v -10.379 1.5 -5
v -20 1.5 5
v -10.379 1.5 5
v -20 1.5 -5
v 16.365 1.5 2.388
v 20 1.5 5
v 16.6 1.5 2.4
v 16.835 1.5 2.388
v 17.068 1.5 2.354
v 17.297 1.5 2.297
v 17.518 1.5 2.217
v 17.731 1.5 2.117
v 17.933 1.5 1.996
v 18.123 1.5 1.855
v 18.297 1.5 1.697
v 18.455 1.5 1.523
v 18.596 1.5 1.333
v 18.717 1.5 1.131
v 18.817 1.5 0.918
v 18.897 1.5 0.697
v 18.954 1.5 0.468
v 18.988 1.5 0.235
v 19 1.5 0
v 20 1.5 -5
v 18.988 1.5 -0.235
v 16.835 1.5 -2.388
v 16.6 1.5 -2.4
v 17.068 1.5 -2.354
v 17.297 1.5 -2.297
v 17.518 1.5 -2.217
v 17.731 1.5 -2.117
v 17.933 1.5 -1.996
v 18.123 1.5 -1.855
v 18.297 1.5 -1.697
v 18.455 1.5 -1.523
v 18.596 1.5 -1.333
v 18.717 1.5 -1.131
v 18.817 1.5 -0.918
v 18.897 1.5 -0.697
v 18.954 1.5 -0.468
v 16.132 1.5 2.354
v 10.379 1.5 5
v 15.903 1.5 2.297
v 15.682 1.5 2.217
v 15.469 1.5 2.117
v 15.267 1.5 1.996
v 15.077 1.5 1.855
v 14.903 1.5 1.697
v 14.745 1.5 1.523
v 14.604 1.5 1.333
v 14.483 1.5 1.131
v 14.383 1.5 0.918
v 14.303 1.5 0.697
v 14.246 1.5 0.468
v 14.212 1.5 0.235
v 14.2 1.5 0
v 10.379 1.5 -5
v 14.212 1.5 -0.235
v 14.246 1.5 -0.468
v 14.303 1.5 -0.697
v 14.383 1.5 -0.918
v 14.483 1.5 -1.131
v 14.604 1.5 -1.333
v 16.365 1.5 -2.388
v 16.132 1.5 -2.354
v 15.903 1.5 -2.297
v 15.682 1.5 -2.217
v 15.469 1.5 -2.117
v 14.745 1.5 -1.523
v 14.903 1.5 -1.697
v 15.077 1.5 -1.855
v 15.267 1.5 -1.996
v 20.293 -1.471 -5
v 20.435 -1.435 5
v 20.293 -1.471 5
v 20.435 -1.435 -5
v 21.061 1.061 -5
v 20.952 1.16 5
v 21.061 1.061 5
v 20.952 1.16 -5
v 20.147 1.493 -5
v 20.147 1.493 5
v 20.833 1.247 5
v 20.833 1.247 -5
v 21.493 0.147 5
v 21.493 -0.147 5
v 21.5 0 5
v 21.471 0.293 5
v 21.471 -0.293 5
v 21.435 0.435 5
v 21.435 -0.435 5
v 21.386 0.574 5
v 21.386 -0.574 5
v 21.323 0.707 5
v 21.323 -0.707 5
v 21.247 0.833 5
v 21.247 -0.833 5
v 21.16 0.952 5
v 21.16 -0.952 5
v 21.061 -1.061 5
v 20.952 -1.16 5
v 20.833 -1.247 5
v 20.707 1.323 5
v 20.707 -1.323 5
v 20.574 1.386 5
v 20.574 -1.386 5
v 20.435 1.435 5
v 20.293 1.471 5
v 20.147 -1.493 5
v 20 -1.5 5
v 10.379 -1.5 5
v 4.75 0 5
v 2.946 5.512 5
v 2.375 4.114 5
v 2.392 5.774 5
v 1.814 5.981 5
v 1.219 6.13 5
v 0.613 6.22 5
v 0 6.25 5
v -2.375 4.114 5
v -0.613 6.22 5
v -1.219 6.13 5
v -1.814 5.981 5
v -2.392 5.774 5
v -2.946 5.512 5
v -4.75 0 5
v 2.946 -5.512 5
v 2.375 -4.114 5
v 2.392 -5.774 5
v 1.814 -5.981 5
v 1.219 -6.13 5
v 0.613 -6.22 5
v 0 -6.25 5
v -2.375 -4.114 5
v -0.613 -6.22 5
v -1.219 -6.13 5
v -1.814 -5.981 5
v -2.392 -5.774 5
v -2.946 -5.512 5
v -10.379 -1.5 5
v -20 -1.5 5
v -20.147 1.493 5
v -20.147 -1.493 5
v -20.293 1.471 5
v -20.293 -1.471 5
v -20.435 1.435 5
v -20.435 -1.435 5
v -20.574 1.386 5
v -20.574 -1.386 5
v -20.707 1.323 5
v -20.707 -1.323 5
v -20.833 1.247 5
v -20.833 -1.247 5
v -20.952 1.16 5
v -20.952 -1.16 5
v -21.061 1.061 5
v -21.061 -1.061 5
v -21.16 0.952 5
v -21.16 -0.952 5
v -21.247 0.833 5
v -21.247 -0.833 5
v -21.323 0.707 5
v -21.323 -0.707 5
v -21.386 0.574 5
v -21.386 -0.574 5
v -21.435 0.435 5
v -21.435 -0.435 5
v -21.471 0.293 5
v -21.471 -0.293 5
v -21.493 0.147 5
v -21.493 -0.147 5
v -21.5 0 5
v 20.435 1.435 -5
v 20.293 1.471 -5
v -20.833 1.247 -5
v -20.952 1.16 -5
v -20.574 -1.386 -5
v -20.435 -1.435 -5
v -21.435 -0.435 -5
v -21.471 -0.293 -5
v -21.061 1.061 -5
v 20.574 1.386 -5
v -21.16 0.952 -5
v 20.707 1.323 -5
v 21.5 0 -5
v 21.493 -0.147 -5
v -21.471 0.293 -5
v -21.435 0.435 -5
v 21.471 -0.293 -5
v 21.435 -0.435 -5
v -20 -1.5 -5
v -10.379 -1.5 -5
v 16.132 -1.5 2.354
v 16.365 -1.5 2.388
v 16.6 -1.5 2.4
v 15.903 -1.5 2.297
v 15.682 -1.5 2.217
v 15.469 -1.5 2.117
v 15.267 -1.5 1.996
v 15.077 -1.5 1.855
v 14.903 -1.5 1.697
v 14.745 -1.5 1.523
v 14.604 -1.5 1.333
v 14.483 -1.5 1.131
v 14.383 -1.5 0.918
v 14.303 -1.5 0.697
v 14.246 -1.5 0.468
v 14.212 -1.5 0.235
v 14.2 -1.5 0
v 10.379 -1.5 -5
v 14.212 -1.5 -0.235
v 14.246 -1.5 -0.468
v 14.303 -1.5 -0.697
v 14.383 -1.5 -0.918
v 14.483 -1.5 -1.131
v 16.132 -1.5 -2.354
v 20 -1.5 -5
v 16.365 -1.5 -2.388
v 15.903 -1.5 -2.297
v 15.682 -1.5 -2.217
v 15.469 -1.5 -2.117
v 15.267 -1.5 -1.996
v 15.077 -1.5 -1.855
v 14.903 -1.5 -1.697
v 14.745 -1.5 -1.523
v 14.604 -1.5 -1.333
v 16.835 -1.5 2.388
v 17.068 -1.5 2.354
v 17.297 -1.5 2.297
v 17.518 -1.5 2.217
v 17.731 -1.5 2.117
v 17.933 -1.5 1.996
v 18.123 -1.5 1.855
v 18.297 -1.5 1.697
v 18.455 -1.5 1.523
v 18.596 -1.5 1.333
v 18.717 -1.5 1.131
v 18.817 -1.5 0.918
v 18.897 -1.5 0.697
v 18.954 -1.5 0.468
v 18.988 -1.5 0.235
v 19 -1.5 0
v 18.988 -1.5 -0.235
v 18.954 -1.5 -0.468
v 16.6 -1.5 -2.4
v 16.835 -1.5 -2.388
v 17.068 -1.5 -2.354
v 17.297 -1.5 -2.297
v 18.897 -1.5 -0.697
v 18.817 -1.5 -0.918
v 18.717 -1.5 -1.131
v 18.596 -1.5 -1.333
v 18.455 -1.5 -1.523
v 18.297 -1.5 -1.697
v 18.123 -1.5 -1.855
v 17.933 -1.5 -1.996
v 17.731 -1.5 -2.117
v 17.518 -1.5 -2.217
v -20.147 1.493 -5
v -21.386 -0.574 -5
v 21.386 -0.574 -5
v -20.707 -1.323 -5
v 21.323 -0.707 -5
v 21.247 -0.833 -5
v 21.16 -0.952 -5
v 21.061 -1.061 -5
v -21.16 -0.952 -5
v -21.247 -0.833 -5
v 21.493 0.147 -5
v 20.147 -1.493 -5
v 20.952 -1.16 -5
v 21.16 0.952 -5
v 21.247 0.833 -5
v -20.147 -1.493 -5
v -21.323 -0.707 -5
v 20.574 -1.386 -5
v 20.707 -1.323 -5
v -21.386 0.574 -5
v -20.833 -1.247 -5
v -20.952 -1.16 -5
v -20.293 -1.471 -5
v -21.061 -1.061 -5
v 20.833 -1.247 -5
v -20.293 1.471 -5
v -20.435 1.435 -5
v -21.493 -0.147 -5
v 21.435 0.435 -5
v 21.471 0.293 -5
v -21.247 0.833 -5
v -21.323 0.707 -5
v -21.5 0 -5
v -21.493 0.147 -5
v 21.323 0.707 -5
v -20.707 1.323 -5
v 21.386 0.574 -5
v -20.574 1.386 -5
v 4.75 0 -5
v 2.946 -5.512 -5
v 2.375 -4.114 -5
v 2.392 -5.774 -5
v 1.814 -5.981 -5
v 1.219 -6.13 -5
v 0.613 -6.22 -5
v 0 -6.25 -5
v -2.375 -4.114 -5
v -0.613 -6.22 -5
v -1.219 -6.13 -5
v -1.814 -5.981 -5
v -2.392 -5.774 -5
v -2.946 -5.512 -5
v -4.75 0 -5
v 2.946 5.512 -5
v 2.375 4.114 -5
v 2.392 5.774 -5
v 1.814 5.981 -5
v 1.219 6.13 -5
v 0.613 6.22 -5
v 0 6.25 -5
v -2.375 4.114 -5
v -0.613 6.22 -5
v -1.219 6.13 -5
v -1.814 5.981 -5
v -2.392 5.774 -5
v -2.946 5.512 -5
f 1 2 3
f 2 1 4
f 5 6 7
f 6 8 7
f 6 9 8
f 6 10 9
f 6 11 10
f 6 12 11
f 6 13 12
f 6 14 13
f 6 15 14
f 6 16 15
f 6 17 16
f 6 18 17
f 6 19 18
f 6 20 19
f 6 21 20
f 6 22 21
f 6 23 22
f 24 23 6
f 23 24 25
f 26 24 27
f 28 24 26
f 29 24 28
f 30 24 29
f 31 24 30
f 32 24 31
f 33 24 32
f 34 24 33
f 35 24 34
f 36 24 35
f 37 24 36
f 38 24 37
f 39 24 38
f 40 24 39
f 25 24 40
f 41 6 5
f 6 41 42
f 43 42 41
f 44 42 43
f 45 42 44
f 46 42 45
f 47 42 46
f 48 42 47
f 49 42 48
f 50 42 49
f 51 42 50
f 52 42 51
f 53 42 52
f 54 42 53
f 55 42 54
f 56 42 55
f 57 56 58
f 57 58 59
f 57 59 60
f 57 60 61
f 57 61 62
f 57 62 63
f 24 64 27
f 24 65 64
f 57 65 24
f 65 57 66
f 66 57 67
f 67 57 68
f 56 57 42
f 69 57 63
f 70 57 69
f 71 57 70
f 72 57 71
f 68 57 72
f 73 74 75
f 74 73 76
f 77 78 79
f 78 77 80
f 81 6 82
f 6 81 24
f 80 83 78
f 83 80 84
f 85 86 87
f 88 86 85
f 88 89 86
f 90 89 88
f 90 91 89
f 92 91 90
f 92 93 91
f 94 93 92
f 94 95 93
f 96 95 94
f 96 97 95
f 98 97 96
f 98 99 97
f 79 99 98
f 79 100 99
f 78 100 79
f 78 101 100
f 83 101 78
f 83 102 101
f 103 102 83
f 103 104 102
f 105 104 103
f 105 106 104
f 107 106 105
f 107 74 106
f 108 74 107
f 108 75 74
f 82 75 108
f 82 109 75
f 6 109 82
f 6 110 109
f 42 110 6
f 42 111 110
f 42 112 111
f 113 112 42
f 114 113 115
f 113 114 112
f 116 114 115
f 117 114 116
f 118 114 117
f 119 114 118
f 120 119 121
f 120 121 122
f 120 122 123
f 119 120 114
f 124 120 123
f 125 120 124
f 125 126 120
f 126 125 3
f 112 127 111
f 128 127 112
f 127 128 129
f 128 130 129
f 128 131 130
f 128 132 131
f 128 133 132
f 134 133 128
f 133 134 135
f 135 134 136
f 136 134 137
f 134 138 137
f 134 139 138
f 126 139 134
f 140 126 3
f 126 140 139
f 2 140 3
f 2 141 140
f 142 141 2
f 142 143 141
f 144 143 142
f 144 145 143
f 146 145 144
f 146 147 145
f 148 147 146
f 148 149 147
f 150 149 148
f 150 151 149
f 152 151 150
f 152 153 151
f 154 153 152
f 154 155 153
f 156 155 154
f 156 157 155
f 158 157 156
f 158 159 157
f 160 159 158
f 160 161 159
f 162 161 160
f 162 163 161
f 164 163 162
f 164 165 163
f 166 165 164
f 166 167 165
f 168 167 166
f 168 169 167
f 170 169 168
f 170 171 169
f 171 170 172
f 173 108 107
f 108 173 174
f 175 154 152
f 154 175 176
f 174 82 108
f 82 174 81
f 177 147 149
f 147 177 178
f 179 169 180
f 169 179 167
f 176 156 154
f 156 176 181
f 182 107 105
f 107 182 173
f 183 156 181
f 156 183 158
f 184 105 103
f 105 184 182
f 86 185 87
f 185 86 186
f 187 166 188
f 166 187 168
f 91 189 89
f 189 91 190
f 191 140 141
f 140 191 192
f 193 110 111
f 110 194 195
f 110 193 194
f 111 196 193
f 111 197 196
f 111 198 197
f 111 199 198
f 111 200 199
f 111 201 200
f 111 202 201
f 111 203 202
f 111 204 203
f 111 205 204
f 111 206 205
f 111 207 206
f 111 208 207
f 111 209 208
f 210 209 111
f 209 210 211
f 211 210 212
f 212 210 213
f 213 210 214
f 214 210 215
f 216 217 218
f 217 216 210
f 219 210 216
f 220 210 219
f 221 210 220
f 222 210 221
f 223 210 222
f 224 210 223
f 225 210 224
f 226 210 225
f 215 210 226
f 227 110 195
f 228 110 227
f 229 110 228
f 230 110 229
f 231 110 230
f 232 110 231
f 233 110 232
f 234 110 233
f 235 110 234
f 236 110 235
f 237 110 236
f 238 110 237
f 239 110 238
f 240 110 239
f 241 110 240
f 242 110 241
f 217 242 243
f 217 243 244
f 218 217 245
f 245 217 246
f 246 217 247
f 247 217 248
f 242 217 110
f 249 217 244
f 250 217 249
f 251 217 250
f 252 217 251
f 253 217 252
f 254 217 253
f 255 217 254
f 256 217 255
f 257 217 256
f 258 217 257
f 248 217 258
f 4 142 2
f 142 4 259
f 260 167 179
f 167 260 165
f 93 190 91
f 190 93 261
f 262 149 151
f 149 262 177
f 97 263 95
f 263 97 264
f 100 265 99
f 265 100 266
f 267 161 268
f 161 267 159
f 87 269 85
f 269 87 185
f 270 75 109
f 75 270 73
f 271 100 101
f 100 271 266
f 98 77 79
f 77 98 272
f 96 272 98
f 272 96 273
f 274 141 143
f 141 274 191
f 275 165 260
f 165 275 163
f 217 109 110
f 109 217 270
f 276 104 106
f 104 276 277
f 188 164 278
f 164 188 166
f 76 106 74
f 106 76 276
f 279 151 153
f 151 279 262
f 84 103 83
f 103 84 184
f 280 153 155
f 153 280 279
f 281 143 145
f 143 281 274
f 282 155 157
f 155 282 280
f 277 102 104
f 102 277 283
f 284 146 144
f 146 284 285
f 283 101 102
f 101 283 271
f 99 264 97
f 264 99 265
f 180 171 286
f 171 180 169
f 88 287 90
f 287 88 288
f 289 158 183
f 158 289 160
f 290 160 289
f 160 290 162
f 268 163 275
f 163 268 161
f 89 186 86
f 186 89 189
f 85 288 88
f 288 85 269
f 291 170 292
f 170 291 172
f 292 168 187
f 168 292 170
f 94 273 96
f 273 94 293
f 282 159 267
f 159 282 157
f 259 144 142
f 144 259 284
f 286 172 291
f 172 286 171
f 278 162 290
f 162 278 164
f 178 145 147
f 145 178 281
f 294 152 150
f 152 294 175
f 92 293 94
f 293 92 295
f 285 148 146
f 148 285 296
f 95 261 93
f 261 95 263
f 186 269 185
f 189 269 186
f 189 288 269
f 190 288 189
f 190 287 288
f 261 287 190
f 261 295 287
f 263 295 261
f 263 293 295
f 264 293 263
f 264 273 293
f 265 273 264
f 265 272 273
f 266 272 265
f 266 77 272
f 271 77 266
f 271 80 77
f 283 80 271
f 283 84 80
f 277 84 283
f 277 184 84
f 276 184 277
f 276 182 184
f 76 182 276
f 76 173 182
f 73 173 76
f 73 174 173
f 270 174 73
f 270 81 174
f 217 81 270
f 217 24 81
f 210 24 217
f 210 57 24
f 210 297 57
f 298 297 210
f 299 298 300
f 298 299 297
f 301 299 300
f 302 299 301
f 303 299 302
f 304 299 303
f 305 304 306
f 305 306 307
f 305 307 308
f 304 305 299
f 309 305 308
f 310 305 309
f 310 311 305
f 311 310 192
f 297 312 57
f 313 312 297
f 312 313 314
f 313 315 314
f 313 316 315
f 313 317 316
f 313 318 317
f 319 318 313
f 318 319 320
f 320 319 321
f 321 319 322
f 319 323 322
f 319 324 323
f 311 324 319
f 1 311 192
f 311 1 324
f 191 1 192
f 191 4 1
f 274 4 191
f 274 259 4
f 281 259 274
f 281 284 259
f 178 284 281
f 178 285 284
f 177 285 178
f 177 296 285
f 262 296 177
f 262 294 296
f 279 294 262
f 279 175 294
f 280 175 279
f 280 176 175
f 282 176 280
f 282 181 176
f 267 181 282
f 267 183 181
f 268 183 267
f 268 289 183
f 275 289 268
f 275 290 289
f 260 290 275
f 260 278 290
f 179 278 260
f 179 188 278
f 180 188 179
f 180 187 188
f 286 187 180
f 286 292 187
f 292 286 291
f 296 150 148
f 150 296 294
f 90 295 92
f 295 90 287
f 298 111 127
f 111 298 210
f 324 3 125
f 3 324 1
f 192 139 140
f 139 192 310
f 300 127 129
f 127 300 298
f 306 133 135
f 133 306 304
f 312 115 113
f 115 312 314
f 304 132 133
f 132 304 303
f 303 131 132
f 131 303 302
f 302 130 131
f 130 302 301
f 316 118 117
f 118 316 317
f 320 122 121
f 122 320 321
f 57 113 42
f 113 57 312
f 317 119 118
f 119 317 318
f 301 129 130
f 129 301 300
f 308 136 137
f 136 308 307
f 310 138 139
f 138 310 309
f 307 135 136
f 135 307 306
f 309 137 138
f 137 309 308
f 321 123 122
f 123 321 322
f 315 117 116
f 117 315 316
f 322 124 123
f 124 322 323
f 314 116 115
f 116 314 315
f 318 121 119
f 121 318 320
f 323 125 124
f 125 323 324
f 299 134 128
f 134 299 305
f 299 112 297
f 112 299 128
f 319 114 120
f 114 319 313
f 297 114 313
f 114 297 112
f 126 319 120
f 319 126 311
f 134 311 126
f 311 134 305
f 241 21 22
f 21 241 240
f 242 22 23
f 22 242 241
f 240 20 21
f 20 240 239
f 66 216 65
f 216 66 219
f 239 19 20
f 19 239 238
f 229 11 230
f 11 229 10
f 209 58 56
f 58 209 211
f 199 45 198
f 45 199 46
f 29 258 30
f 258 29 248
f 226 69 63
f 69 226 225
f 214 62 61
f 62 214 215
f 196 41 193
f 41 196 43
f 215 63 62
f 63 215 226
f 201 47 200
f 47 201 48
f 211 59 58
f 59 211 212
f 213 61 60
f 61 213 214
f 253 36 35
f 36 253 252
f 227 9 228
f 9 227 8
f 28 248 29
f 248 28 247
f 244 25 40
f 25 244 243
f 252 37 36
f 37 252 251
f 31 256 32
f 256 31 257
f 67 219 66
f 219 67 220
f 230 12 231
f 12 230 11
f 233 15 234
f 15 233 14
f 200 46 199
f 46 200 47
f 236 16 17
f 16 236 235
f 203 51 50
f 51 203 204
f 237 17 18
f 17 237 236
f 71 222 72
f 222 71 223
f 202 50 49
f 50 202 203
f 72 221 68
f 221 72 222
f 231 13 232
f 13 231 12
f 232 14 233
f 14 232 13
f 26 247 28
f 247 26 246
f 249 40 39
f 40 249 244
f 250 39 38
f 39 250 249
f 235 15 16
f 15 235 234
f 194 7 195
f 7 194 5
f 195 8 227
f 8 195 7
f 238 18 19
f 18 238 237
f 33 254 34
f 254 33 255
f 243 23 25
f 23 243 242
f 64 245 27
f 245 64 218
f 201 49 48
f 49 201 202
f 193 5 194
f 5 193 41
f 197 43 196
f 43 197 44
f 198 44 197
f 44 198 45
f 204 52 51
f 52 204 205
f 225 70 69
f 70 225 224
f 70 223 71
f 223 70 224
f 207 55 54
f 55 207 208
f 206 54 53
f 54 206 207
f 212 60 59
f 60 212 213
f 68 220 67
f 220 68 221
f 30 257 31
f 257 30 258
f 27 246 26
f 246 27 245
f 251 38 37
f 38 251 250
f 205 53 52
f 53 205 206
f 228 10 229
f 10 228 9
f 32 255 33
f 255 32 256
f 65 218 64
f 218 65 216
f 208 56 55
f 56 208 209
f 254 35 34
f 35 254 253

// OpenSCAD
// Hole diameter (bottom)
bottomHole = 9.5;
// Hole diameter (top, this should be the bigger one)
topHole = 9.5;
// Height of the tool
height = 10;
// Thickness of the handle
thickness = 3;
// Length of the handle on each side
length = 20;
// Thickness of the walls
walls = 3;
// Diameter of the keychain hole
keyhole = 4.8;

/* [Hidden] */
$fn = 64;

difference() {
  group() {
    hull() {
      translate([-length, 0, 0])
        cylinder(r = thickness /2, h = height, center = true);
        
      translate([length, 0, 0])
        cylinder(r = thickness /2, h = height, center = true);
    }

    hull() {
      cylinder(r = (topHole + walls) / 2, h = height, center = true);
      
      translate([-length / 2, 0, 0])
        cylinder(r = thickness /2, h = height, center = true);
        
      translate([length / 2, 0, 0])
        cylinder(r = thickness /2, h = height, center = true);
    }
  }
  
  cylinder(r = bottomHole / 2, h = height + 2, center = true, $fn=6);
  
  translate([0, 0, height/2])
    cylinder(r = topHole / 2, h = height + 2, center = true, $fn=6);
  
  translate([length - keyhole / 2 - 1, 0, 0])
  rotate([90, 0, 0])
    cylinder(r = keyhole / 2, h = height + 2, center = true);
}
